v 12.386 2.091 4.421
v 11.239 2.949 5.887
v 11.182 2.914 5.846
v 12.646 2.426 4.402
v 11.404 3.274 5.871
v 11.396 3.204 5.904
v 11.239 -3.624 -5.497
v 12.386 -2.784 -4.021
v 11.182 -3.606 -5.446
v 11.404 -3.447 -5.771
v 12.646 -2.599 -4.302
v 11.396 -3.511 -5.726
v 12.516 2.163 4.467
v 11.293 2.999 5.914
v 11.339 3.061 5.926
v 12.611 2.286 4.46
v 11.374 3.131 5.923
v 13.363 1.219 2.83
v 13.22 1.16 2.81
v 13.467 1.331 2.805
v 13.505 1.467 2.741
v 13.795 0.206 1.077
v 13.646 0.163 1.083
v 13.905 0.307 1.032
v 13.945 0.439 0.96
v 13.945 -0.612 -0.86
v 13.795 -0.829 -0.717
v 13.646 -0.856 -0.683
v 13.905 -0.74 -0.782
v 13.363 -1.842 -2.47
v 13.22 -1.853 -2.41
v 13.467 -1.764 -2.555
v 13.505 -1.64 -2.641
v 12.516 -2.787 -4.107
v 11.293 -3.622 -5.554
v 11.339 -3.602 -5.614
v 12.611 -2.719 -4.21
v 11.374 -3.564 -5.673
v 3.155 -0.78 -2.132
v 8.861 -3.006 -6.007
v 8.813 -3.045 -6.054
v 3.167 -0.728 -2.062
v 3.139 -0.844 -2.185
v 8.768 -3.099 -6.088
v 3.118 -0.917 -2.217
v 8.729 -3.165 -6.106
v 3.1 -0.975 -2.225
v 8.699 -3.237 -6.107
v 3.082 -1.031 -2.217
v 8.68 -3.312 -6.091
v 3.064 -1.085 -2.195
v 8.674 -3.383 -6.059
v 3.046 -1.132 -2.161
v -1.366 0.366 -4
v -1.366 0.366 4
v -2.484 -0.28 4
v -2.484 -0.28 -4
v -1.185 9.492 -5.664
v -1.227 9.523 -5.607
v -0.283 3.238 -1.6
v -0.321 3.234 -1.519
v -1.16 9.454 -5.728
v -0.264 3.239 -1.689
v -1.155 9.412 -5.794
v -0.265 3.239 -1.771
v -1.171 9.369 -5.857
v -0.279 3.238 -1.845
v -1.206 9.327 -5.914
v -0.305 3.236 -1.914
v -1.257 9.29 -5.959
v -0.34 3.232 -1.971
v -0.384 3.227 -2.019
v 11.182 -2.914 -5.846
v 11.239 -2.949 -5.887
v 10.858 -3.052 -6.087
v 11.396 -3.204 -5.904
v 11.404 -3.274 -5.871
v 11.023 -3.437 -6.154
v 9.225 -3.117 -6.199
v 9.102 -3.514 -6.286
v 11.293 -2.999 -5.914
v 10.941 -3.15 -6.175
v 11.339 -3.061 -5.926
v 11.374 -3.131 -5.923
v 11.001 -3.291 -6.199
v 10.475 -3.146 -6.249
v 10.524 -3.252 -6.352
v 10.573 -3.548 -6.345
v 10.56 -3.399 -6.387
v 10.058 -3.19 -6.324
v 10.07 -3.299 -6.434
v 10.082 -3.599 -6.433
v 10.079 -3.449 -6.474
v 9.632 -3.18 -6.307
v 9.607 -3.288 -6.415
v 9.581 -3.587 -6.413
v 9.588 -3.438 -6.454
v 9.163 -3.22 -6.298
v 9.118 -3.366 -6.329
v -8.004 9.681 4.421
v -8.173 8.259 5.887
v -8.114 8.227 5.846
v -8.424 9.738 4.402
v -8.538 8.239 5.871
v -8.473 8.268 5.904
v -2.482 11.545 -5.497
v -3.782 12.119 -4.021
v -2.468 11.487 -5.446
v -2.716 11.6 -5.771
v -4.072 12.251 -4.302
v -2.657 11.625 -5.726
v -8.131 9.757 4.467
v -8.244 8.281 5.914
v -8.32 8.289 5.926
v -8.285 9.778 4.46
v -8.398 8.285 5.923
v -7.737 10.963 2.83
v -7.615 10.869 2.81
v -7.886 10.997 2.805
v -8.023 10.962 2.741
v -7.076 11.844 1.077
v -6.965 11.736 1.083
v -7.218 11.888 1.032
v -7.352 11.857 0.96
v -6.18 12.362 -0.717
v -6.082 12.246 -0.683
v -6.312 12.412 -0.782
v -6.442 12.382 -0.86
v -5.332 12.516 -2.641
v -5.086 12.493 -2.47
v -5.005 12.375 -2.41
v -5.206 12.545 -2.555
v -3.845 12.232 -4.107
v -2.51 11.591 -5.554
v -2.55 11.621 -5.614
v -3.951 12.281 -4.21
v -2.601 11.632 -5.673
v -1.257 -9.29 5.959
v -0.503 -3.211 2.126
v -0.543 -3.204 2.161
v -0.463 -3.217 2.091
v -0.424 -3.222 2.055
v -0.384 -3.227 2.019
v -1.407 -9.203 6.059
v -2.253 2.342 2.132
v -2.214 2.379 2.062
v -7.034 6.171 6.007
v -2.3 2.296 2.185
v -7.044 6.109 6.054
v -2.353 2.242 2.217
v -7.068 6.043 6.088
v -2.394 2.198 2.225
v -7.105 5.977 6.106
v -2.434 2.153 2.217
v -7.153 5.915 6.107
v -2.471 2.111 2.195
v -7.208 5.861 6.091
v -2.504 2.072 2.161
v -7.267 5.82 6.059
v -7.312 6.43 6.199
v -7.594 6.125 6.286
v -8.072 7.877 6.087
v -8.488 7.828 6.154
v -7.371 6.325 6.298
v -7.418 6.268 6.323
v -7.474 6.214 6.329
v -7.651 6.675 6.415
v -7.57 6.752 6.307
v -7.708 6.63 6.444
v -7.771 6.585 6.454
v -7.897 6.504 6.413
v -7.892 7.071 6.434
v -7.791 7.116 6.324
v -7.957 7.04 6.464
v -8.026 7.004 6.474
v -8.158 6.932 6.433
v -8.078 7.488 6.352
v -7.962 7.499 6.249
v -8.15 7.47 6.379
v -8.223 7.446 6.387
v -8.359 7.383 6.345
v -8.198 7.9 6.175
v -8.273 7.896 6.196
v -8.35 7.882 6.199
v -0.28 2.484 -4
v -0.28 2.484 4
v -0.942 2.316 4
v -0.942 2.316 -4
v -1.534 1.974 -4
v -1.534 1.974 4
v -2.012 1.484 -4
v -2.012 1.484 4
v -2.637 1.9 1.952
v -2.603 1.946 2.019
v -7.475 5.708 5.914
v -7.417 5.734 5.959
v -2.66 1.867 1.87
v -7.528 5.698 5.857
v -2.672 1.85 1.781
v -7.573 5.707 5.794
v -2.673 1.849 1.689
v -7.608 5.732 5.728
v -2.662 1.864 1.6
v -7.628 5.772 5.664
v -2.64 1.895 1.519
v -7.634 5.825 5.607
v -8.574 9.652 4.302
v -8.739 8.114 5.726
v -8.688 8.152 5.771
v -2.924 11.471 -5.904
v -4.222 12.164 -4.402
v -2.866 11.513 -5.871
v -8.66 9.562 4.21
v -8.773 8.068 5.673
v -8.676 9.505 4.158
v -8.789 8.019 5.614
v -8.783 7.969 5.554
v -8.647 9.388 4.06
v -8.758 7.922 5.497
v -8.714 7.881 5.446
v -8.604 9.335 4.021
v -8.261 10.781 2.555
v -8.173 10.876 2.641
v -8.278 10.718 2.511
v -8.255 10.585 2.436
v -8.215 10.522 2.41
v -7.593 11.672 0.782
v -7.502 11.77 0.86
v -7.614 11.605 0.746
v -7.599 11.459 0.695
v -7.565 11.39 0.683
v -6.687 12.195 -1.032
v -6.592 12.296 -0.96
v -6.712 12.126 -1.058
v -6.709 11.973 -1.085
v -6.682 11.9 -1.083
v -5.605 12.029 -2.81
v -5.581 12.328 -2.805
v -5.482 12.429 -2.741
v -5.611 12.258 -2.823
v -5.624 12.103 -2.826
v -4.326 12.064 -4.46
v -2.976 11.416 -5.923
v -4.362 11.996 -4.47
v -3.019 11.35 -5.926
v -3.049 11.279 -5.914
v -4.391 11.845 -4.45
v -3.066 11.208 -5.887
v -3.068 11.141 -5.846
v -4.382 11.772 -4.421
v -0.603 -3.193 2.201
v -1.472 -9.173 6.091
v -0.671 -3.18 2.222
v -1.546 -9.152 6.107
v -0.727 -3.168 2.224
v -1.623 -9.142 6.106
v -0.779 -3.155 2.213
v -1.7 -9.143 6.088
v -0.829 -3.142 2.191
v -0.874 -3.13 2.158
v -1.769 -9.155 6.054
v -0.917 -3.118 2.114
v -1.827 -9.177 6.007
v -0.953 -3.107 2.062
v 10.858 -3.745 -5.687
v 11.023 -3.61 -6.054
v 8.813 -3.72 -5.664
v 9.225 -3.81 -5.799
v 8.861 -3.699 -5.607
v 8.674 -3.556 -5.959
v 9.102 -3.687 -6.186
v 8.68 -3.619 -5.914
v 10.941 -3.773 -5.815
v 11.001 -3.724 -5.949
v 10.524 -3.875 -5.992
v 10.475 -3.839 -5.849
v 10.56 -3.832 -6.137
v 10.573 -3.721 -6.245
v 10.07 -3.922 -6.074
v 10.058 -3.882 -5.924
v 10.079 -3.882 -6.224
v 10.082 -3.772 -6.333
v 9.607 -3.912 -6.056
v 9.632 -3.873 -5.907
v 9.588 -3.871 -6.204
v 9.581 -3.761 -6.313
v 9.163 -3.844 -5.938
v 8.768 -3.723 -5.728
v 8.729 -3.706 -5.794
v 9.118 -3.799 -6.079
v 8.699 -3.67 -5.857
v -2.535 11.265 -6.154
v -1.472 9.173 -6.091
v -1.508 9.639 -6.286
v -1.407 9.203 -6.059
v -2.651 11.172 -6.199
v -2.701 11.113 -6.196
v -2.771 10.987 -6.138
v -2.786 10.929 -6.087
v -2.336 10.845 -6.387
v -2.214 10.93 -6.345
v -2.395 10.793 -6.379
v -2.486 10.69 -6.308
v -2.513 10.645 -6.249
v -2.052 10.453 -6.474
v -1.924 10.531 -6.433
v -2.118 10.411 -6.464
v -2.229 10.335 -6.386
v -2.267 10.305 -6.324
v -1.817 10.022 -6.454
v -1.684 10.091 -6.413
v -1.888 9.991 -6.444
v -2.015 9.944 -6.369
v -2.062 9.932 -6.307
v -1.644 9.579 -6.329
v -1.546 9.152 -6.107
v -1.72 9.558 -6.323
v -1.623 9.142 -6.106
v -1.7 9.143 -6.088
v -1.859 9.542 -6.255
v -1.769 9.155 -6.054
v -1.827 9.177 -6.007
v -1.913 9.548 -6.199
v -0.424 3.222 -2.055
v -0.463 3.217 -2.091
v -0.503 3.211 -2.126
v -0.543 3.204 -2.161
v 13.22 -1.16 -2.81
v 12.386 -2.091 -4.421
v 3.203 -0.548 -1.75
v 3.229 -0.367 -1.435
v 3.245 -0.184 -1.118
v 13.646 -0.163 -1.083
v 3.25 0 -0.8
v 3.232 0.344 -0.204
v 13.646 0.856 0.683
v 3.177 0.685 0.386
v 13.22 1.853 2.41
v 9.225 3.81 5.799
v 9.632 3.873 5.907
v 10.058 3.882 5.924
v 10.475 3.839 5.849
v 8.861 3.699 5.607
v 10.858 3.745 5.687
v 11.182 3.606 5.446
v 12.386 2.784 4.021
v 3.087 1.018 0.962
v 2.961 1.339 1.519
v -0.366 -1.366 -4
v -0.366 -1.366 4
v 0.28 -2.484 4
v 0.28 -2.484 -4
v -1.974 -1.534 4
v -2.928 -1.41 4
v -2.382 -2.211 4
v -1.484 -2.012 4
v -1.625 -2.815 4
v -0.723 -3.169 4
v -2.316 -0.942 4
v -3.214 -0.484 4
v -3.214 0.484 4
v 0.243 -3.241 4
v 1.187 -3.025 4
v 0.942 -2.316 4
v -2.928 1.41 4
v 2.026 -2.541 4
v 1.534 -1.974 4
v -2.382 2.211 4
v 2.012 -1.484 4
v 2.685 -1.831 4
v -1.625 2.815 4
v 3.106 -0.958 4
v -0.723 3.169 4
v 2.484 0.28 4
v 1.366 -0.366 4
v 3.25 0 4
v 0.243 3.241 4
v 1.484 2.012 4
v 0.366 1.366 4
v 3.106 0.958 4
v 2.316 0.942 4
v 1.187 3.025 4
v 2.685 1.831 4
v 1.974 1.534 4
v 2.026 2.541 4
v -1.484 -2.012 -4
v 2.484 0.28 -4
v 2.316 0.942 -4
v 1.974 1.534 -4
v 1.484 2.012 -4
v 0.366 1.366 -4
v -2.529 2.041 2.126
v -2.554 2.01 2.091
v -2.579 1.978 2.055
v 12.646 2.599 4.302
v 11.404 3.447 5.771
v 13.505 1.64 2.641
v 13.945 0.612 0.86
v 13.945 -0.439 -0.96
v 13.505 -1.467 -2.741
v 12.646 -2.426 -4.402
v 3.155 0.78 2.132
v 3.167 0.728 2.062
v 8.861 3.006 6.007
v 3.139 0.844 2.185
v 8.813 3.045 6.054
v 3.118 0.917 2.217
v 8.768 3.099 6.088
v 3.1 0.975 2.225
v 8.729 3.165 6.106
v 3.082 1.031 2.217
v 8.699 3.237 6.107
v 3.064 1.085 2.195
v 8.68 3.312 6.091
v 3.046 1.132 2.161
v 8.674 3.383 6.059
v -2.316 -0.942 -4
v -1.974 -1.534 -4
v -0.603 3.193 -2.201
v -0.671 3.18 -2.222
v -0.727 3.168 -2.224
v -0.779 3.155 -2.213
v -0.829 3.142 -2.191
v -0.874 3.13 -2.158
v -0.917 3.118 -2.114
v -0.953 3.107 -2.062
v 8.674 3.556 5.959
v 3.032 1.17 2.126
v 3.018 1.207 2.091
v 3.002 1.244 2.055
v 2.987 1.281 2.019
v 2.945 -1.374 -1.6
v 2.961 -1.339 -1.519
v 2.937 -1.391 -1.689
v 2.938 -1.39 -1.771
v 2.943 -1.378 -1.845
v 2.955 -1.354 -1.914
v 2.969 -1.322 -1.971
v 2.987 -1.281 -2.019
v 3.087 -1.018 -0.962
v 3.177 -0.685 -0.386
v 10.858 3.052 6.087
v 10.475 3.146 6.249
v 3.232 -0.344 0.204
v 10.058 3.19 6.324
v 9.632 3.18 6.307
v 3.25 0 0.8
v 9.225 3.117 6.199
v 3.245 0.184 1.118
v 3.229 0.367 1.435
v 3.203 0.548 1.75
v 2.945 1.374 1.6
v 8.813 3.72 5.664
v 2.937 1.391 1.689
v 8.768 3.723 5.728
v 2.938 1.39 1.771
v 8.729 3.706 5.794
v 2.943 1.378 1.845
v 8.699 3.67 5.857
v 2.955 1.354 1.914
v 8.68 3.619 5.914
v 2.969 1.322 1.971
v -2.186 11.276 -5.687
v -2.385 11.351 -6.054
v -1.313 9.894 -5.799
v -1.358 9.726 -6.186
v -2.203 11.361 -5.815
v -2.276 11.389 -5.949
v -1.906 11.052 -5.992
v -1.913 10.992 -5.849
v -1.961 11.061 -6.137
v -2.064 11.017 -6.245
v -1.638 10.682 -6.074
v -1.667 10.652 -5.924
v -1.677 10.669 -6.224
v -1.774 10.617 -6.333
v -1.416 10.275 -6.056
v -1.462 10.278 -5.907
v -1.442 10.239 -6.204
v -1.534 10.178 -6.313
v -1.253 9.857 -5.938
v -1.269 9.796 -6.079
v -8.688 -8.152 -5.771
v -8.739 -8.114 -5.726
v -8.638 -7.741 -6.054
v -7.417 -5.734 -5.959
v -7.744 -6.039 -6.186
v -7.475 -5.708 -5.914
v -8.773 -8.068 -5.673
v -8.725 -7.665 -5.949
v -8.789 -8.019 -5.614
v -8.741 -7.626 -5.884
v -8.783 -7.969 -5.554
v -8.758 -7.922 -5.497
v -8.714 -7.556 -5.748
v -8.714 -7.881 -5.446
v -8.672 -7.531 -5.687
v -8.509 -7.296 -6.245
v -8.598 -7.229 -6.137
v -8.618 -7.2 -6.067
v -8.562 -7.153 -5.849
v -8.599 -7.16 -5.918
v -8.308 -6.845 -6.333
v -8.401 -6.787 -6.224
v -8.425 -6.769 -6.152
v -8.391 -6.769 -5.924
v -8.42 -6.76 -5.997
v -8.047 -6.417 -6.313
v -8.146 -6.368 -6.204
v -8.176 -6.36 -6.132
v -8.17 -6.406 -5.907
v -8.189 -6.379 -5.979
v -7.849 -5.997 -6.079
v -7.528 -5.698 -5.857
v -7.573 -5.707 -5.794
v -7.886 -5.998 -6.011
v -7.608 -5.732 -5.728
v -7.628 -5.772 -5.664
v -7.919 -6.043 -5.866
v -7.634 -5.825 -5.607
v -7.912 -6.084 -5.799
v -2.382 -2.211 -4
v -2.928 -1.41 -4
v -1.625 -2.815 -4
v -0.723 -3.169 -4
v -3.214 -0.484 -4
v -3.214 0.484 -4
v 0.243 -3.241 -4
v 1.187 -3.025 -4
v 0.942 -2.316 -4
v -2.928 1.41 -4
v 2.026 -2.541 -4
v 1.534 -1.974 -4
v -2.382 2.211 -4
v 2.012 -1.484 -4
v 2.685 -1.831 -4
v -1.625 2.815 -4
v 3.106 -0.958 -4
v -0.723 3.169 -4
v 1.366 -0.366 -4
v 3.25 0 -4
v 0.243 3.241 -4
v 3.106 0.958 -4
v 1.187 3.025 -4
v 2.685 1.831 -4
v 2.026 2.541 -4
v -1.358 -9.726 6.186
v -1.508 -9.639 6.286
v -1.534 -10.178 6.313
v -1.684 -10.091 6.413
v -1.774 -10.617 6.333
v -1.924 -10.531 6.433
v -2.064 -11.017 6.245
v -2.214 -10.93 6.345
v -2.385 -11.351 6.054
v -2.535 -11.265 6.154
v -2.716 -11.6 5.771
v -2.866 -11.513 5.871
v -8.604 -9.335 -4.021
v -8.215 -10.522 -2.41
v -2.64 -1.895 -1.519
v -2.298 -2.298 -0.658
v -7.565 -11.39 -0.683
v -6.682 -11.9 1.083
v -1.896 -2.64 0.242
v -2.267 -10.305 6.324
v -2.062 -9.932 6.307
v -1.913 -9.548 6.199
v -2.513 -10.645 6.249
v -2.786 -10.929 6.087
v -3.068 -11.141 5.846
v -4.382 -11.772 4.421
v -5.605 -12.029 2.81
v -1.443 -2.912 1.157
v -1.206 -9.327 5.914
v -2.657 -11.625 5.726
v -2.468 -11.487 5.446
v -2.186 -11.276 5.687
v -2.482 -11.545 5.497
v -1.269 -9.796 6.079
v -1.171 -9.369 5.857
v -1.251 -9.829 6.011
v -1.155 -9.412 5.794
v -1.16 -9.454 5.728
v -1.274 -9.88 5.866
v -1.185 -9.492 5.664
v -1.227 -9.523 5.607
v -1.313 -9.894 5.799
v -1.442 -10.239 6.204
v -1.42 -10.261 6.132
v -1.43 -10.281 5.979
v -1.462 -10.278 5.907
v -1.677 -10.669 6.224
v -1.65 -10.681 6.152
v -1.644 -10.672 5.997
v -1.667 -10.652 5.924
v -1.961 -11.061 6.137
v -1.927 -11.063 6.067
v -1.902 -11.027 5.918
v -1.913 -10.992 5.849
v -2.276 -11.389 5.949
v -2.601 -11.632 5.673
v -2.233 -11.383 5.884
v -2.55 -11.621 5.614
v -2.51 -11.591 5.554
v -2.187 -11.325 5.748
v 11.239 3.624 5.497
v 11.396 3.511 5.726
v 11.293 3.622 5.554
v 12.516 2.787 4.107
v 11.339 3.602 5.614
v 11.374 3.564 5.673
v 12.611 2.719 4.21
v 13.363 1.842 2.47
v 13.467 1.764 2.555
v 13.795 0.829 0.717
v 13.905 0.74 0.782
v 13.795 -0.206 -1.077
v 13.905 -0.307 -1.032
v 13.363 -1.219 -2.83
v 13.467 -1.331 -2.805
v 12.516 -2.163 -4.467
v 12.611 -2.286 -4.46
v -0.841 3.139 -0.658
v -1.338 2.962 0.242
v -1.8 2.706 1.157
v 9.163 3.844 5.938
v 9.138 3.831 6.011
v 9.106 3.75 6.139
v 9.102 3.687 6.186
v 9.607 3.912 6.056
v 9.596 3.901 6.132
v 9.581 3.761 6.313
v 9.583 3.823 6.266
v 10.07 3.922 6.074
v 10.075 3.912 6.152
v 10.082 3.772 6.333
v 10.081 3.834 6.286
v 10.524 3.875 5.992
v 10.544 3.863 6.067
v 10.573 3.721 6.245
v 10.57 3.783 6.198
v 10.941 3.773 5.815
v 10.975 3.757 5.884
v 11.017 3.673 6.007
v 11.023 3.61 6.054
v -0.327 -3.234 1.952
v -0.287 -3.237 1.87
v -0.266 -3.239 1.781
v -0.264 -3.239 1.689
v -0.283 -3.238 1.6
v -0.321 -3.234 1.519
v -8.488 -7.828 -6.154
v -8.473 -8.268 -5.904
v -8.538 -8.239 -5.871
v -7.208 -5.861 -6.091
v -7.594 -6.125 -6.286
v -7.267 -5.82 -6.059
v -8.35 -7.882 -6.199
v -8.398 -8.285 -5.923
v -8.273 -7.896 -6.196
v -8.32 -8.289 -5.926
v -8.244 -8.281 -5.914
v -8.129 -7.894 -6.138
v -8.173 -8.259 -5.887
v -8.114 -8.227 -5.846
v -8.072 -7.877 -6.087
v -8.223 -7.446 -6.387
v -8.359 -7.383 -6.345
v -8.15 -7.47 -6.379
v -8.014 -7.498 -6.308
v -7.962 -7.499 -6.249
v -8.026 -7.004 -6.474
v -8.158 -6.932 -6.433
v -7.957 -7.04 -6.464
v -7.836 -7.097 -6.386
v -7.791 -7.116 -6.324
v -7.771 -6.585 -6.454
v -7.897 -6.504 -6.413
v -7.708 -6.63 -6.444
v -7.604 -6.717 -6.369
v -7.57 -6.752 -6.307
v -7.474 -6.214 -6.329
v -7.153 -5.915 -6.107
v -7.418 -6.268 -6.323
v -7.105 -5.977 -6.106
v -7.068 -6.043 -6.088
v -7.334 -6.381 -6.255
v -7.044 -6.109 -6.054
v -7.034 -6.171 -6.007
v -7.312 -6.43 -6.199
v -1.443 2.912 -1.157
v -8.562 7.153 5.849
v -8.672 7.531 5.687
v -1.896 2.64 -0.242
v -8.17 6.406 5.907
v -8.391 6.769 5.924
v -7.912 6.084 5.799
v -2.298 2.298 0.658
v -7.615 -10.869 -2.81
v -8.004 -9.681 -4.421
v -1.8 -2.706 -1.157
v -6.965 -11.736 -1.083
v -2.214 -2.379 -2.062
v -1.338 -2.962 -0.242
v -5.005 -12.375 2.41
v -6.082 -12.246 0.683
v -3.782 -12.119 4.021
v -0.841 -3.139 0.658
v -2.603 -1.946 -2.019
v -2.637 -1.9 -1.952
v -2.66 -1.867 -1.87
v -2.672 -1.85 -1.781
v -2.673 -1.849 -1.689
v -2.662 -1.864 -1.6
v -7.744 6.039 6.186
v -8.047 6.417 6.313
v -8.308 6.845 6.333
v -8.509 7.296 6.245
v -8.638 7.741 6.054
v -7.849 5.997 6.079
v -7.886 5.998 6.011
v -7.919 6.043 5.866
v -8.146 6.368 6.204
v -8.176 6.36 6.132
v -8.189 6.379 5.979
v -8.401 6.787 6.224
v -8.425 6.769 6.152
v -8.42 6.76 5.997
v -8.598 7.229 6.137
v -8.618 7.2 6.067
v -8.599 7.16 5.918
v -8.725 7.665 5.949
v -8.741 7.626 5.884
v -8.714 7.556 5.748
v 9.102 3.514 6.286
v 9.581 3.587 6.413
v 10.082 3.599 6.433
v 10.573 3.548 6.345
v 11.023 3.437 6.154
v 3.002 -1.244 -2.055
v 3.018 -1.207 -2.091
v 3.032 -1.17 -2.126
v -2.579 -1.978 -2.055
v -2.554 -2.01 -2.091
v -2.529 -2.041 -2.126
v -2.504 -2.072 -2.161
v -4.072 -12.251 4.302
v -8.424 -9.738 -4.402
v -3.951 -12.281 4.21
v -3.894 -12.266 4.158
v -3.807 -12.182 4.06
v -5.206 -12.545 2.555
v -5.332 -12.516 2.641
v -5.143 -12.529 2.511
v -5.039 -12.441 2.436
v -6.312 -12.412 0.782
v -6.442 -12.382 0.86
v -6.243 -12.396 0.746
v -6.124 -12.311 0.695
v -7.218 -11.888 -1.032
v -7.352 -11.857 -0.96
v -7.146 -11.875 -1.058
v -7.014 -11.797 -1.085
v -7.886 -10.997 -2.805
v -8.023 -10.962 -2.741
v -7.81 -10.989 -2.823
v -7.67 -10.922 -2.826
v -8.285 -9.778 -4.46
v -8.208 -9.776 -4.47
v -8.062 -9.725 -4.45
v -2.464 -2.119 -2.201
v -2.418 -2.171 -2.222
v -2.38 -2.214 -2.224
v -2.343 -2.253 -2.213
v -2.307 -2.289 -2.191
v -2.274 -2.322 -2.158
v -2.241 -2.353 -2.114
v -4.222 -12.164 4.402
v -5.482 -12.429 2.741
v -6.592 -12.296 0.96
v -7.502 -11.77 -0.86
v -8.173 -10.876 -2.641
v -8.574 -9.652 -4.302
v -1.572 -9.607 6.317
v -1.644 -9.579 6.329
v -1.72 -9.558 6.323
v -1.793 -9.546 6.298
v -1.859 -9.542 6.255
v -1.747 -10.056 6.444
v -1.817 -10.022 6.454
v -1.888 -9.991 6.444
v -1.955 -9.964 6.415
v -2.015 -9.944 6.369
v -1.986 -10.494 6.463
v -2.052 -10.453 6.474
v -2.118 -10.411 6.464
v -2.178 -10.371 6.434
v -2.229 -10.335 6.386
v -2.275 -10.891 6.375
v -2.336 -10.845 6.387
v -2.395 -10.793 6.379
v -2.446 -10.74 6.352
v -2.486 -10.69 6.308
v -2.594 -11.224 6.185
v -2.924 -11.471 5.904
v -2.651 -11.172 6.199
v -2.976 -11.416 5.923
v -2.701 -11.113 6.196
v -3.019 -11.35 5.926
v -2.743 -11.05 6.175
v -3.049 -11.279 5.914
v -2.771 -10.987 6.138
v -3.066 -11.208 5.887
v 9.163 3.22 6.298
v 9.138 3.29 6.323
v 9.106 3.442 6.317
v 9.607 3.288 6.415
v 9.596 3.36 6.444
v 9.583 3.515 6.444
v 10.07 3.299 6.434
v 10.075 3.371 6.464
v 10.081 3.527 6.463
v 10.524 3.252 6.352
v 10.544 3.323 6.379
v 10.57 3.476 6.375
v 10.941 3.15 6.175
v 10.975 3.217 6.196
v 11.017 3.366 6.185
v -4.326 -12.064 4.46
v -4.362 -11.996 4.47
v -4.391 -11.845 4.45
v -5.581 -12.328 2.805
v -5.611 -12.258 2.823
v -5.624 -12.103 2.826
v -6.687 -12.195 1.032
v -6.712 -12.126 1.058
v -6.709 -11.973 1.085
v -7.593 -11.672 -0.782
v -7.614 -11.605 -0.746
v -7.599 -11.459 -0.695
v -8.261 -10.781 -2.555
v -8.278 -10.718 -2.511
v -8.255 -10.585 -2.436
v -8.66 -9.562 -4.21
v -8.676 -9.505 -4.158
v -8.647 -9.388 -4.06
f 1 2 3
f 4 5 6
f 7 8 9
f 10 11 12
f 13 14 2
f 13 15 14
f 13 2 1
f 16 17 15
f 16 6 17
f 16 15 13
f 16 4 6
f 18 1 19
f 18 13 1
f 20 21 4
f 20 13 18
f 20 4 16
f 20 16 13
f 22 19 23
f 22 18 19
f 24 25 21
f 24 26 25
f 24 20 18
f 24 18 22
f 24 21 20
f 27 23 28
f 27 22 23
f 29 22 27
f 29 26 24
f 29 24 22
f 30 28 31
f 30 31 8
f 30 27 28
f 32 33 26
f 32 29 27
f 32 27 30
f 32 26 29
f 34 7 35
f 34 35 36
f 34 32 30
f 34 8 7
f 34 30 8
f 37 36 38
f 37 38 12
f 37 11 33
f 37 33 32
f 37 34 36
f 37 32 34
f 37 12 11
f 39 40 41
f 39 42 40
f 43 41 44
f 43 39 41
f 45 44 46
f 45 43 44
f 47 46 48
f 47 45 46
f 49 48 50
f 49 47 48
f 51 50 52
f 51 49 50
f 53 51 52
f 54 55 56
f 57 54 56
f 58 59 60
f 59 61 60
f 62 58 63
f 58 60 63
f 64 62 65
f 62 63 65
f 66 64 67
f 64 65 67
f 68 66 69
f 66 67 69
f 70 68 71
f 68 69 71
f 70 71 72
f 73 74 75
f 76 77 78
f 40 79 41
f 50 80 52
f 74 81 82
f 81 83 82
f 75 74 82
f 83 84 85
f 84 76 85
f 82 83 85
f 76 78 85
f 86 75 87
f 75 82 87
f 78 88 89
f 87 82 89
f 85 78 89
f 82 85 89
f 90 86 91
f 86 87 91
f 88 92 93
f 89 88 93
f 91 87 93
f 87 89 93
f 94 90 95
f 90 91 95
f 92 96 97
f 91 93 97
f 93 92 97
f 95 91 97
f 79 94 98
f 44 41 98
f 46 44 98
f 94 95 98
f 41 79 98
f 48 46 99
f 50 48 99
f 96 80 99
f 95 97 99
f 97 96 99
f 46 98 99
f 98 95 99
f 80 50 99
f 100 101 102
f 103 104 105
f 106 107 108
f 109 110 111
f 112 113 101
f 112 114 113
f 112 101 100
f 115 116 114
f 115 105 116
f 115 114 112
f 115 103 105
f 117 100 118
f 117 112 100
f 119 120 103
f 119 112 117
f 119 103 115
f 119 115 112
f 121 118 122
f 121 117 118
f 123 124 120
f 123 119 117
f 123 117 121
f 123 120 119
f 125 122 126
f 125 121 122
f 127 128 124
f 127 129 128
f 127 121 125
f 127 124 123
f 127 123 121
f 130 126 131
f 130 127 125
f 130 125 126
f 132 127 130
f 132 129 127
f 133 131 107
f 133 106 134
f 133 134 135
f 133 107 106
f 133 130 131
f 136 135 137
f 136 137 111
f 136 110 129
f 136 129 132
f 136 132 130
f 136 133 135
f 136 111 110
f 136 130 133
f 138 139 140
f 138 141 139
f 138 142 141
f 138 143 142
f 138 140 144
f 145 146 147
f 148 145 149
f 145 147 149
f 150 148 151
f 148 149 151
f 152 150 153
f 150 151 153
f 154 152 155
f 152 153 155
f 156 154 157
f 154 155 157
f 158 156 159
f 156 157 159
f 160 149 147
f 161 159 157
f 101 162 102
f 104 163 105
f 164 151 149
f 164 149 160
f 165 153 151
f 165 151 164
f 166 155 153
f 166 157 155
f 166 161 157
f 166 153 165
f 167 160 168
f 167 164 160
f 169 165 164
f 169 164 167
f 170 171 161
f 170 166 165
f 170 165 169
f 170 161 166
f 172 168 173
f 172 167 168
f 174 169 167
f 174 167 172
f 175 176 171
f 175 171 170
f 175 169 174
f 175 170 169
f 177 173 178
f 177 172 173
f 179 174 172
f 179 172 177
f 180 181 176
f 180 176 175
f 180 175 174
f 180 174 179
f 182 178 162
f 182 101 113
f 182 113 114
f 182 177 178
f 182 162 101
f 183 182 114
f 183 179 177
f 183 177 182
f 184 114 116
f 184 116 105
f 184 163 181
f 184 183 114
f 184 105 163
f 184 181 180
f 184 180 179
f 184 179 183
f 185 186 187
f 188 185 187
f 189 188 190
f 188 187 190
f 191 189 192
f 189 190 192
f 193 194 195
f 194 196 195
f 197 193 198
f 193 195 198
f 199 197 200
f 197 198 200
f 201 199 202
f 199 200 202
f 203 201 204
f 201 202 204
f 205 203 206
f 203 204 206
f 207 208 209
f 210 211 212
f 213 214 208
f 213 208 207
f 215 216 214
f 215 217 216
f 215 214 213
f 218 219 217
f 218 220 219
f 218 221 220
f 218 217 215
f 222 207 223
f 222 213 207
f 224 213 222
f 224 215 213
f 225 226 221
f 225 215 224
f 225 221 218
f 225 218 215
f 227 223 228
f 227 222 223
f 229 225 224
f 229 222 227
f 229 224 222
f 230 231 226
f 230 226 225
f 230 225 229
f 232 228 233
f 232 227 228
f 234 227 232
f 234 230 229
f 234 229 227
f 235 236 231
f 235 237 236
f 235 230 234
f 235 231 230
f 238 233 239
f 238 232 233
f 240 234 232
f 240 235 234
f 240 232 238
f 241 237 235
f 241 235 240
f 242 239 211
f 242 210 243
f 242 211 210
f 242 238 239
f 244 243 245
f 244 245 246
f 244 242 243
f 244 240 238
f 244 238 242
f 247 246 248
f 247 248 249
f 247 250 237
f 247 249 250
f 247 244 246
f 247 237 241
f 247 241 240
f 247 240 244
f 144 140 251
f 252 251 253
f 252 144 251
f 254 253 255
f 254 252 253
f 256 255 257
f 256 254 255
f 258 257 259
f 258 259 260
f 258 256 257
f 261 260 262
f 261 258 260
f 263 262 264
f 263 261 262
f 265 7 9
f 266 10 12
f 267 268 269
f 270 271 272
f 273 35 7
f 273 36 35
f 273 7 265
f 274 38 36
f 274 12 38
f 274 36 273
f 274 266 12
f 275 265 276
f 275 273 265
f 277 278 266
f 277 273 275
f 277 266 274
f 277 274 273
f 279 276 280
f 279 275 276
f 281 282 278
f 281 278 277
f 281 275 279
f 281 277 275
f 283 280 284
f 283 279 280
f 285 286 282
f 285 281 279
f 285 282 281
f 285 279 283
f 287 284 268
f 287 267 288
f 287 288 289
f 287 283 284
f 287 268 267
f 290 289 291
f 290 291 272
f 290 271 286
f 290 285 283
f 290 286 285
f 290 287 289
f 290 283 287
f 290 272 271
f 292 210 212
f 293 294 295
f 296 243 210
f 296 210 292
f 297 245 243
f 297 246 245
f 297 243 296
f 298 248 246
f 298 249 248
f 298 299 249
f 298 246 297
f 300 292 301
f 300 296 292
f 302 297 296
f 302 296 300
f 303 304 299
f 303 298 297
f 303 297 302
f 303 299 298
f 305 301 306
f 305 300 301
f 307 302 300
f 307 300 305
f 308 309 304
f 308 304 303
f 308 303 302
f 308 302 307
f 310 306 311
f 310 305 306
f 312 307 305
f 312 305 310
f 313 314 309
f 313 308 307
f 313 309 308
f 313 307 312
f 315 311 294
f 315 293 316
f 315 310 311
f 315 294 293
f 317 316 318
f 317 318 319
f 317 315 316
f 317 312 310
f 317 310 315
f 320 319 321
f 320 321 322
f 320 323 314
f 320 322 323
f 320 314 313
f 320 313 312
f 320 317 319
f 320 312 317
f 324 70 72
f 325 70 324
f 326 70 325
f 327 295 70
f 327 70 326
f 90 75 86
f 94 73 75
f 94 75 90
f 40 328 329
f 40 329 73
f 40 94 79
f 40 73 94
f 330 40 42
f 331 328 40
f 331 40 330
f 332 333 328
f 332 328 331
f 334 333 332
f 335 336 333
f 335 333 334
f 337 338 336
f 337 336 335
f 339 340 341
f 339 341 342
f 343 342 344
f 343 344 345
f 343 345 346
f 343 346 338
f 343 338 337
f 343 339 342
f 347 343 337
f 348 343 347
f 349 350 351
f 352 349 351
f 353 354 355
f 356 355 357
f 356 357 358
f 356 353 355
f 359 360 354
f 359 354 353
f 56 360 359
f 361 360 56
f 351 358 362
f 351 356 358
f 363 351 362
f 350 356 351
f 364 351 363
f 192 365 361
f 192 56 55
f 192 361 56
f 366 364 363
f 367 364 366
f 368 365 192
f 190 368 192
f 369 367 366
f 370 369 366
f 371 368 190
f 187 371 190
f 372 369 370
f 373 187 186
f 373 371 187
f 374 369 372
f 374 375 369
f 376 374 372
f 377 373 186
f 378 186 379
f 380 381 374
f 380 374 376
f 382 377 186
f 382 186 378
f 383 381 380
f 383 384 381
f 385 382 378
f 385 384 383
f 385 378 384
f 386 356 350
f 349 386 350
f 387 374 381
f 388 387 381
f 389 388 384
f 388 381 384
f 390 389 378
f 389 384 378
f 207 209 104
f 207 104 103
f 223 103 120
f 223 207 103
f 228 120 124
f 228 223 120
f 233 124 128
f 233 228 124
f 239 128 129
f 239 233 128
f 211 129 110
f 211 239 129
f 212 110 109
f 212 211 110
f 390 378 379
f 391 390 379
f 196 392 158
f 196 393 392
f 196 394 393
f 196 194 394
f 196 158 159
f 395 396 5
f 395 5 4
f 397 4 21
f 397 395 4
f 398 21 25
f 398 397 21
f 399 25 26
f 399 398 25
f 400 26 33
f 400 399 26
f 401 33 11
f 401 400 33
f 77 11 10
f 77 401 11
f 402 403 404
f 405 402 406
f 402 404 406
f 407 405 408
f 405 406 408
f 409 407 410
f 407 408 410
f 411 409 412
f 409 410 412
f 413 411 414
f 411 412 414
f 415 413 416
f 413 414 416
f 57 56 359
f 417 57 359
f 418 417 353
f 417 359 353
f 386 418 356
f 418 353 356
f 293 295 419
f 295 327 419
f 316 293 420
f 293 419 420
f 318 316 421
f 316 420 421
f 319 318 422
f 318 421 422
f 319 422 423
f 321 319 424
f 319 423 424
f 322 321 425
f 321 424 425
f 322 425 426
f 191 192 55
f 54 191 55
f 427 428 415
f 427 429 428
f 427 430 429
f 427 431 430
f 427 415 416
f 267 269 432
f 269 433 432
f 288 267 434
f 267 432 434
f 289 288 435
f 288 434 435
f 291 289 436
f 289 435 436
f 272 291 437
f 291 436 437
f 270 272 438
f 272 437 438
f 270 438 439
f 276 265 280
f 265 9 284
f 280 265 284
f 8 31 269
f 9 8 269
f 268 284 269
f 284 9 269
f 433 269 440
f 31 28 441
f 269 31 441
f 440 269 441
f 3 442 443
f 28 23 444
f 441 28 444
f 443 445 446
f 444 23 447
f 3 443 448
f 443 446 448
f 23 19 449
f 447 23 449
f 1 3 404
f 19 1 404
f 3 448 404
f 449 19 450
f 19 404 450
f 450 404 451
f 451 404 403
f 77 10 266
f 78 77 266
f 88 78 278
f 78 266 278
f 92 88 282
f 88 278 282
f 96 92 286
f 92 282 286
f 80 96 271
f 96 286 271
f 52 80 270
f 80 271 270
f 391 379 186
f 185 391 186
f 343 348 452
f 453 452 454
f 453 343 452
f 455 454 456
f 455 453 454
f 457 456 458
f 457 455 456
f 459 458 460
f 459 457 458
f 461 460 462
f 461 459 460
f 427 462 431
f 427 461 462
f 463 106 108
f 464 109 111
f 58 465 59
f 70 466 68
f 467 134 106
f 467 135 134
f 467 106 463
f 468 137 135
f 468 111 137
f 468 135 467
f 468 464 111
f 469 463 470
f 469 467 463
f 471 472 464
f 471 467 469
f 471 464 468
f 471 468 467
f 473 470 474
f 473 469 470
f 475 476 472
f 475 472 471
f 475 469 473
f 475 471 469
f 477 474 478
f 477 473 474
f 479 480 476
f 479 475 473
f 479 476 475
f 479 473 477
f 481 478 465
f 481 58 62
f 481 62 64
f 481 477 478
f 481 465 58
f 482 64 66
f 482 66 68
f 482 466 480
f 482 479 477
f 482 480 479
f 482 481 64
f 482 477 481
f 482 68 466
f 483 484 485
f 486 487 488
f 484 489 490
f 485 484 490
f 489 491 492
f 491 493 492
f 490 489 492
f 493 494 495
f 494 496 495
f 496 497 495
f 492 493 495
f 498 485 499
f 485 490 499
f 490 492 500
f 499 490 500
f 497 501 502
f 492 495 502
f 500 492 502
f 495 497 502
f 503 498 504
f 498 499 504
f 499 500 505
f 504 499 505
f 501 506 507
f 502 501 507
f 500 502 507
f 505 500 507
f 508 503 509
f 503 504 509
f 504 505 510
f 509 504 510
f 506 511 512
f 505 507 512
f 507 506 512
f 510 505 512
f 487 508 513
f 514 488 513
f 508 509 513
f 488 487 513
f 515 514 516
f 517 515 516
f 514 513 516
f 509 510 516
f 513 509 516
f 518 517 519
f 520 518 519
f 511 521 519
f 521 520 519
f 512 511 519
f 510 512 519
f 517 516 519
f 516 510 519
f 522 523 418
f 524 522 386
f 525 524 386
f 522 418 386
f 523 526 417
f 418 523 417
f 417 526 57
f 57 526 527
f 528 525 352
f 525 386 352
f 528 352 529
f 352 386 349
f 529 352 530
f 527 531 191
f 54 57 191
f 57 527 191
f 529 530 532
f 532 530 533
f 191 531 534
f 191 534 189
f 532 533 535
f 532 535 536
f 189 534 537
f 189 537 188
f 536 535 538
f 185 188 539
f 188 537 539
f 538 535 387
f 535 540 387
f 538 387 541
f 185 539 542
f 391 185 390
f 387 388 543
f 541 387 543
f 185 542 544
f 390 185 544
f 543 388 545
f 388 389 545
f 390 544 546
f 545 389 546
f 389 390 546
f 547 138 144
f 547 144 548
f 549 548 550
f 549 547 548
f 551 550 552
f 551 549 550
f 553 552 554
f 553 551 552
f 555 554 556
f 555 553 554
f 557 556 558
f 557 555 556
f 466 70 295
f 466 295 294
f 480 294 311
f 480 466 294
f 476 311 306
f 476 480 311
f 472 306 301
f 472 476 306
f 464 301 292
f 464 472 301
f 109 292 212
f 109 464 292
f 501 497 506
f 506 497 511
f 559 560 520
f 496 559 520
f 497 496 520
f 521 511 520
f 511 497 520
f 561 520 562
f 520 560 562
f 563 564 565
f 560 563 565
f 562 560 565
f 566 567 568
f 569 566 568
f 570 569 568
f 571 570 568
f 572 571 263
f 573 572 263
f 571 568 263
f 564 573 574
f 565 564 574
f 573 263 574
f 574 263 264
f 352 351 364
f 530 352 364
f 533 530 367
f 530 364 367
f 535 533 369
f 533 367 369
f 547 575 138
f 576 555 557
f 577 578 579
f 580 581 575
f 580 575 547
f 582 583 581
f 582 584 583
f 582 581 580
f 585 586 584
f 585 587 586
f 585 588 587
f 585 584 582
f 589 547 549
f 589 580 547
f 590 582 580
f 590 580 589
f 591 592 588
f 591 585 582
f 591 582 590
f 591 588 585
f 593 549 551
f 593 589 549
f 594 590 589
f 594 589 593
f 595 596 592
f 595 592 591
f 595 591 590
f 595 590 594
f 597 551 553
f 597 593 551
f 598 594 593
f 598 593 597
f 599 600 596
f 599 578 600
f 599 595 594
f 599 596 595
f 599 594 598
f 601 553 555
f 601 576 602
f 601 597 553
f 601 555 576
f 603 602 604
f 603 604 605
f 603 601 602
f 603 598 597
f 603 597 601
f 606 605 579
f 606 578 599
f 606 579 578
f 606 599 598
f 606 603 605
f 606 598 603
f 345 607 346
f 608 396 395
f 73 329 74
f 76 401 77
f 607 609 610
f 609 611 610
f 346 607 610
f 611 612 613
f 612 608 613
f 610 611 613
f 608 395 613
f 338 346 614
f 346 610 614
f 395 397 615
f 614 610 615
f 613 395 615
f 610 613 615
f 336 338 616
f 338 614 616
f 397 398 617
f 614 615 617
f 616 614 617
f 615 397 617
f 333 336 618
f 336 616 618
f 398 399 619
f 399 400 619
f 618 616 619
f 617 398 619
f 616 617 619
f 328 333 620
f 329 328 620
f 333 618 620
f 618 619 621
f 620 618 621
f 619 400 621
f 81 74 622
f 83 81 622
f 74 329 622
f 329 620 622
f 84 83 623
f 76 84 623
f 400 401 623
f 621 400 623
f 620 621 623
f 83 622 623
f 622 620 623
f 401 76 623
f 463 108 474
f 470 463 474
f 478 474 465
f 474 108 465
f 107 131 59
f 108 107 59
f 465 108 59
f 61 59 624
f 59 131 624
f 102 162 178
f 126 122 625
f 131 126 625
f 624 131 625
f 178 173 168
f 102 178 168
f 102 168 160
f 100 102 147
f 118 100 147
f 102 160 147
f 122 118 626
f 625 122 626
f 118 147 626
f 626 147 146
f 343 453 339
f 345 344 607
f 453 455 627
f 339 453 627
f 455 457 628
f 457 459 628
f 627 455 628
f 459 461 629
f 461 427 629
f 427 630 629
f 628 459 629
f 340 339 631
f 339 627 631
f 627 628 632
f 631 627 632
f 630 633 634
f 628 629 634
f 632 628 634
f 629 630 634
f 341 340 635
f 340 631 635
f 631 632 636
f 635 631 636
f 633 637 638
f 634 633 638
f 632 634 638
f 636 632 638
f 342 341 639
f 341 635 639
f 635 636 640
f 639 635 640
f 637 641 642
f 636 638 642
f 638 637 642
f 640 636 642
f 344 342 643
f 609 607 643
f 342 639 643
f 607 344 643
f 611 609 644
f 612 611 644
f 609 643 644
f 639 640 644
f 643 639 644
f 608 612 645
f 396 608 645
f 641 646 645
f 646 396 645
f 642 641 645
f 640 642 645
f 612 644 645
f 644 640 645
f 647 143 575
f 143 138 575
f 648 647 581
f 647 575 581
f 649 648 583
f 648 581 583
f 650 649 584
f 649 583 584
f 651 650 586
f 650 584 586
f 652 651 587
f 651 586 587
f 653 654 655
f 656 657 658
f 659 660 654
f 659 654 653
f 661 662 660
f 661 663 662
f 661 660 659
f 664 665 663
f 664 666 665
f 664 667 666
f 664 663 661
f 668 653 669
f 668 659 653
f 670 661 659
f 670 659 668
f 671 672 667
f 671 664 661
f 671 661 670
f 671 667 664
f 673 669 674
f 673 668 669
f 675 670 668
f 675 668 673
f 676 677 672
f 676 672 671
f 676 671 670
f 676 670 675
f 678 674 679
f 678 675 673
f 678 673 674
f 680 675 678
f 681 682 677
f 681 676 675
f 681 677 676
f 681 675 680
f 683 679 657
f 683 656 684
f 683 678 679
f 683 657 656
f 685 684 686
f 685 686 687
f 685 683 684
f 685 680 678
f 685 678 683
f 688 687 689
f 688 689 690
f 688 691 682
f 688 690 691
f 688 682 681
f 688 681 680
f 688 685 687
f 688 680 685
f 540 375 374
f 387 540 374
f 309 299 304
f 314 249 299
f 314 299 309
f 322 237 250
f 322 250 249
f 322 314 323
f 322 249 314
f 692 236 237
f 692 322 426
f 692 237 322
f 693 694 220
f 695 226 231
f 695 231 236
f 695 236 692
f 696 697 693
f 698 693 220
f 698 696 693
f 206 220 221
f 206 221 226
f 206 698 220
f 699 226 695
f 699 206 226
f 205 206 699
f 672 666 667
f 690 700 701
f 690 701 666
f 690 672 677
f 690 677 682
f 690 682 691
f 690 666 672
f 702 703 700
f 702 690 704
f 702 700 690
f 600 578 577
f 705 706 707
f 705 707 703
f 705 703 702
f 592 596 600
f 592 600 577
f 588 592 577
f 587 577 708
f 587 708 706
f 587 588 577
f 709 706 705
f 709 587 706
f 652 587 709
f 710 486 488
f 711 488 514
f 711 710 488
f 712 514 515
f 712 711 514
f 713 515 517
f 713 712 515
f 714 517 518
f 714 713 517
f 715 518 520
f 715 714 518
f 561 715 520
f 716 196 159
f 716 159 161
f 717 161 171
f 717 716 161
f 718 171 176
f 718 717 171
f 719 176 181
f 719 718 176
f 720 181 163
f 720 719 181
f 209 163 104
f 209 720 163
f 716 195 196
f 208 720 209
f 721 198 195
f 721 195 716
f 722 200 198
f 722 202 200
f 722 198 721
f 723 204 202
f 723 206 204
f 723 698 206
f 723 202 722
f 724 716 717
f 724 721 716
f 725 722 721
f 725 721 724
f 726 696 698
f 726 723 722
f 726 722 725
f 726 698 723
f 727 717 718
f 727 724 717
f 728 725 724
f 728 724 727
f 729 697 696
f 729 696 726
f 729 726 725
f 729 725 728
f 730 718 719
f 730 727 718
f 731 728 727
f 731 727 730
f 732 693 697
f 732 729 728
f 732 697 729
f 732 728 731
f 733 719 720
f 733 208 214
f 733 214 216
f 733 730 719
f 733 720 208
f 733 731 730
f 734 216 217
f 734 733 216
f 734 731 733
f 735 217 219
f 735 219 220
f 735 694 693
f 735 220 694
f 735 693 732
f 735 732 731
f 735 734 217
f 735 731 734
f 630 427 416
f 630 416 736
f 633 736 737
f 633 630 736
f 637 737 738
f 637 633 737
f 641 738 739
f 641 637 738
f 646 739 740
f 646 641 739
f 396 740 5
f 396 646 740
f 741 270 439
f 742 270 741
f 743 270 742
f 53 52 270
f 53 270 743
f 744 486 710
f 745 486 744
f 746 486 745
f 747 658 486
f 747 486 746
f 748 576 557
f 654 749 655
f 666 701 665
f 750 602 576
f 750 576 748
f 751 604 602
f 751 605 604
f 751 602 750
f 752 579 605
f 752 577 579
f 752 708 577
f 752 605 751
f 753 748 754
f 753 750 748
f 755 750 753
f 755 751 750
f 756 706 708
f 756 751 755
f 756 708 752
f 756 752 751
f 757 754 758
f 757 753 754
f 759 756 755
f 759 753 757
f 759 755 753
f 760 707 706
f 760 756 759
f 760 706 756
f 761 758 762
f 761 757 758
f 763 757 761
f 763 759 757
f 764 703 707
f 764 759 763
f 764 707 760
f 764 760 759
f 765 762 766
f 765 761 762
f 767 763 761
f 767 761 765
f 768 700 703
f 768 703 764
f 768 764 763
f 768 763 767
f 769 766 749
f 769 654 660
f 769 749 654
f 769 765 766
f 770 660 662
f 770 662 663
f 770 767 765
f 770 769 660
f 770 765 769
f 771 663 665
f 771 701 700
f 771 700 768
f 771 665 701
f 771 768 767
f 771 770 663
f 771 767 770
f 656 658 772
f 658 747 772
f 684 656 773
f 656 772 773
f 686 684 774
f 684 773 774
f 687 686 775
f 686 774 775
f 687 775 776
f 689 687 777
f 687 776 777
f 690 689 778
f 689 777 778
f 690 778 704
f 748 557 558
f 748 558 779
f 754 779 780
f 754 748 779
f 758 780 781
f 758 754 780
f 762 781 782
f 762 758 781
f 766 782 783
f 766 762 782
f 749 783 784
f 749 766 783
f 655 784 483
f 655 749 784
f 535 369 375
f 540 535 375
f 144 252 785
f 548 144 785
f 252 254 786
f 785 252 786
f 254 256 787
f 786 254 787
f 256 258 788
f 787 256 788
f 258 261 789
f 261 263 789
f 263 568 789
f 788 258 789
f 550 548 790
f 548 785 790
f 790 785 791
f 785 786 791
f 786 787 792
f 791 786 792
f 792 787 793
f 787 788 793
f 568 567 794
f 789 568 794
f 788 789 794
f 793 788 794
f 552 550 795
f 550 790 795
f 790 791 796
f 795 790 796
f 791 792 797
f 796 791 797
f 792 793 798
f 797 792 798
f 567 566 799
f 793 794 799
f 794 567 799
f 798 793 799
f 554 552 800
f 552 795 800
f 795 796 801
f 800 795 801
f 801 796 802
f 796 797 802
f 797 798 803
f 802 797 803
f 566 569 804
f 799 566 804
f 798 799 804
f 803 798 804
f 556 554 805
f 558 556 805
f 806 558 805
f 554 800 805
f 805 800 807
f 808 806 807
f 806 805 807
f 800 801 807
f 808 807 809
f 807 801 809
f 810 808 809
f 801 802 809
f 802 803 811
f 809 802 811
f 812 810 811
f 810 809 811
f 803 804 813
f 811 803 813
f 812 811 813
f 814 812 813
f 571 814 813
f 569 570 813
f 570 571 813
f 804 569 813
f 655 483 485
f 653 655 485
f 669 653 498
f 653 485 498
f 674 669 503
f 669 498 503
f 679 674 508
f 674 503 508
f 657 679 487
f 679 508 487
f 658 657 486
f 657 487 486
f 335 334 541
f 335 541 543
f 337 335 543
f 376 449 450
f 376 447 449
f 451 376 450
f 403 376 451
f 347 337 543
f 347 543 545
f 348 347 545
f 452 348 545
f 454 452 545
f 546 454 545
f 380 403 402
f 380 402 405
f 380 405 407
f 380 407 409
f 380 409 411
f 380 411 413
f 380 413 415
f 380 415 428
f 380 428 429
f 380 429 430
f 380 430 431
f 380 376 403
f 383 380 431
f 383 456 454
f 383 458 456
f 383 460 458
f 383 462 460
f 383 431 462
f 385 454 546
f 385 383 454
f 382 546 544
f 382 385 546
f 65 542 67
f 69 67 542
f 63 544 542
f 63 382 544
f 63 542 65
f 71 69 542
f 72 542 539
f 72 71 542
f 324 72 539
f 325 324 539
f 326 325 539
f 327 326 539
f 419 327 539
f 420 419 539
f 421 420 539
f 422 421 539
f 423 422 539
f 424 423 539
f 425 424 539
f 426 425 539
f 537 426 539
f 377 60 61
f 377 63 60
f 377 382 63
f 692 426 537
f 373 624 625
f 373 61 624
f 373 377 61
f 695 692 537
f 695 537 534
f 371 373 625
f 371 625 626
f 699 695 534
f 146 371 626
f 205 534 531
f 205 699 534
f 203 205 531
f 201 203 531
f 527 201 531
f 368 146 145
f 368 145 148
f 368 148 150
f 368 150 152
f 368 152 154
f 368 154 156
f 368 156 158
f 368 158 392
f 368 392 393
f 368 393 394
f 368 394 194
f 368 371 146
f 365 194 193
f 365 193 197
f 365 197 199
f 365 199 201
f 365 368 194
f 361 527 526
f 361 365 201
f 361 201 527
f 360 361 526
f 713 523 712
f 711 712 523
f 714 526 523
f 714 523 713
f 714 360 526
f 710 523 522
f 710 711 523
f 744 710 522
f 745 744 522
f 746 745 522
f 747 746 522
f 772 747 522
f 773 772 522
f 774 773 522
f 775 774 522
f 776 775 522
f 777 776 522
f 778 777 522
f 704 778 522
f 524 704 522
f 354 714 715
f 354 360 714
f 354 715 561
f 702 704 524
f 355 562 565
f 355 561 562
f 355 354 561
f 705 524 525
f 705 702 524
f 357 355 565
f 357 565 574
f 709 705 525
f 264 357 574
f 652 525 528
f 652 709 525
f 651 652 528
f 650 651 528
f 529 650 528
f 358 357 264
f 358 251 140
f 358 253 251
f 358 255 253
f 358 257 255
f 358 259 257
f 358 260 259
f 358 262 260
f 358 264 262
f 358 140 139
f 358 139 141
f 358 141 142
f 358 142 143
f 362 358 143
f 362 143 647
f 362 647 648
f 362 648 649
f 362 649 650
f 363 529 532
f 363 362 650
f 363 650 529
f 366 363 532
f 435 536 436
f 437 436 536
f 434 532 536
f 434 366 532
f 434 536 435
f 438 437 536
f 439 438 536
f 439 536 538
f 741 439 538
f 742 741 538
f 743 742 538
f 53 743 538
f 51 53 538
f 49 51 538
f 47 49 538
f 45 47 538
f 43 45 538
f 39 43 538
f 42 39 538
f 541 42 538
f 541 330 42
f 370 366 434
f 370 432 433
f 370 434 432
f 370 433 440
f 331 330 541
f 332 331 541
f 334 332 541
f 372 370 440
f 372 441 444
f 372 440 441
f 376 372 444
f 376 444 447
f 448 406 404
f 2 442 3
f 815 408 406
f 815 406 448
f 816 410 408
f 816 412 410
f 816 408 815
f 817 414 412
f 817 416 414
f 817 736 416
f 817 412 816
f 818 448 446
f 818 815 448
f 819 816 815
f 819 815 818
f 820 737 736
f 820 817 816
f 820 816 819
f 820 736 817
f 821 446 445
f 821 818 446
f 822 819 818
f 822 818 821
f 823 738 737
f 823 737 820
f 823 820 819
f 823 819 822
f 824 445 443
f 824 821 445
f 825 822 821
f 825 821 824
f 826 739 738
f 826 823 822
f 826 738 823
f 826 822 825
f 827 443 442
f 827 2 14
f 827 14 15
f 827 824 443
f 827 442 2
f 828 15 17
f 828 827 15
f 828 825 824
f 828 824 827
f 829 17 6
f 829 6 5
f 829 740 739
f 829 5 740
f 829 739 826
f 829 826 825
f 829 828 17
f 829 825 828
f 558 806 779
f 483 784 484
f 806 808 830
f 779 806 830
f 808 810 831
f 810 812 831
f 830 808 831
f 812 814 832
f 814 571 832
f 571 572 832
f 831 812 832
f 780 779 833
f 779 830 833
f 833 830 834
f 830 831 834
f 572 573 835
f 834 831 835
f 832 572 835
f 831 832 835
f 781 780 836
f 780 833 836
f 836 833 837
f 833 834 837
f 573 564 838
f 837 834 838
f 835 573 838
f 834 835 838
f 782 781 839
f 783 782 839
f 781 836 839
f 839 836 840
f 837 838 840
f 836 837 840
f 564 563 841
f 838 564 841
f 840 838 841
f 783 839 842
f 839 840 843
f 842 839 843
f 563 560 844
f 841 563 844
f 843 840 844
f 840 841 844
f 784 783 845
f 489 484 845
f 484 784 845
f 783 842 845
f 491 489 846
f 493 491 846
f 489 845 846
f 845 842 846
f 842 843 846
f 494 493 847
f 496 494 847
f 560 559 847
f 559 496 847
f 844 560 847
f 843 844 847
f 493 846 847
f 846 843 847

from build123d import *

# Parameters (mm, degrees)
SKETCH1_R                = 3.25
BOSS_EXTRUDE1_DEPTH      = 4
BOSS_EXTRUDE4_DEPTH      = 0.4
FILLET1_R                = 2
CIRPATTERN2_COUNT        = 3
FILLET1_OF_CIRPATTERN2_R = 2
CUT_EXTRUDE1_REACH       = 23.637
FILLET2_R                = 0.3


with BuildPart() as part:
    # Sketch1 → Boss-Extrude1 (new, symmetric)
    with BuildSketch(Plane.XY):
        Circle(SKETCH1_R)
    extrude(amount=BOSS_EXTRUDE1_DEPTH, both=True)

    # Sketch6 → Boss-Extrude4 (add, symmetric)
    with BuildSketch(Plane(origin=(0, 0, 0), x_dir=(-1, 0, 0), z_dir=(0, 0.866025403784438, -0.500000000000001))):
        with BuildLine():
            Line((0, 0), (-10, 8))
            ThreePointArc((-10, 8), (-14, 0), (-10, -8))
            Line((-10, -8), (0, 0))
        make_face()
    boss_extrude4 = extrude(amount=BOSS_EXTRUDE4_DEPTH, both=True)

    # Fillet1
    fillet1_edges = [part.edges().sort_by_distance(p)[0] for p in [
        (10, -4, -6.92820323),
        (10, 4, 6.92820323),
    ]]
    fillet(fillet1_edges, radius=FILLET1_R)

    # CirPattern2: Boss-Extrude4 ×3 about axis
    cirpattern2_axis = Axis((0, 0, 4), (0, 0, -1))
    for i in range(1, CIRPATTERN2_COUNT):
        add(boss_extrude4.rotate(cirpattern2_axis, i * 360 / CIRPATTERN2_COUNT))

    # Fillet1 of CirPattern2
    fillet1_of_cirpattern2_edges = [part.edges().sort_by_distance(p)[0] for p in [
        (-8.464101615, -6.660254038, -6.92820323),
        (-1.535898385, -10.660254038, 6.92820323),
        (-1.535898385, 10.660254038, -6.92820323),
        (-8.464101615, 6.660254038, 6.92820323),
    ]]
    fillet(fillet1_of_cirpattern2_edges, radius=FILLET1_OF_CIRPATTERN2_R)

    # Sketch7 → Cut-Extrude1 (cut, up to next)
    with BuildSketch(Plane.XY.offset(4), mode=Mode.PRIVATE) as cut_extrude1_sk1:
        with BuildLine():
            Line((1.484313483, 2.011669328), (0.366025404, 1.366025404))
            Line((0.366025404, 1.366025404), (-0.27961852, 2.484313483))
            ThreePointArc((-0.27961852, 2.484313483), (-1.25, 2.165063509), (-2.011669328, 1.484313483))
            Line((-2.011669328, 1.484313483), (-1.366025404, 0.366025404))
            Line((-1.366025404, 0.366025404), (-2.484313483, -0.27961852))
            ThreePointArc((-2.484313483, -0.27961852), (-2.165063509, -1.25), (-1.484313483, -2.011669328))
            Line((-1.484313483, -2.011669328), (-0.366025404, -1.366025404))
            Line((-0.366025404, -1.366025404), (0.27961852, -2.484313483))
            ThreePointArc((0.27961852, -2.484313483), (1.25, -2.165063509), (2.011669328, -1.484313483))
            Line((2.011669328, -1.484313483), (1.366025404, -0.366025404))
            Line((1.366025404, -0.366025404), (2.484313483, 0.27961852))
            ThreePointArc((2.484313483, 0.27961852), (2.165063509, 1.25), (1.484313483, 2.011669328))
        make_face()
    cut_extrude1_tool1 = extrude(cut_extrude1_sk1.sketch, amount=-CUT_EXTRUDE1_REACH, mode=Mode.PRIVATE) & part.part
    add(cut_extrude1_tool1.solids().sort_by_distance((0, 0, 4))[0], mode=Mode.SUBTRACT)

    # Fillet2
    fillet2_edges = [part.edges().sort_by_distance(p)[0] for p in [
        (-1.20587358, -6.114217695, 4.286257479),
        (-2.149245107, -10.400789842, 6.583480561),
        (-7.3, -11.951150572, 0.2),
        (-8.532725669, -6.715285621, -6.183480561),
        (-0.587527, -6.333289225, 3.803498858),
        (-1.549245107, -10.747200003, 6.183480561),
        (-6.7, -12.297560734, -0.2),
        (-7.932725669, -7.061695783, -6.583480561),
        (-5.191025858, 3.67545792, 3.803498858),
        (-8.532725669, 6.715285621, 6.183480561),
        (-7.3, 11.951150572, -0.2),
        (-1.20587358, 6.114217695, -4.286257479),
        (-0.587527, 6.333289225, -3.803498858),
        (-4.692131059, 4.101426001, 4.286257479),
        (-7.932725669, 7.061695783, 6.583480561),
        (-6.7, 12.297560734, 0.2),
        (5.778552858, -2.657831305, -3.803498858),
        (10.081970776, -4.031914382, -6.183480561),
        (14, -0.346410162, 0.2),
        (10.081970776, 3.339094059, 6.583480561),
        (5.898004638, -2.012791694, -4.286257479),
        (10.081970776, -3.339094059, -6.583480561),
        (14, 0.346410162, -0.2),
        (10.081970776, 4.031914382, 6.183480561),
        (-5.191025858, -3.67545792, -3.803498858),
        (-4.692131059, -4.101426001, -4.286257479),
        (-2.149245107, 10.400789842, -6.583480561),
        (-1.549245107, 10.747200003, -6.183480561),
        (5.898004638, 2.012791694, 4.286257479),
        (5.778552858, 2.657831305, 3.803498858),
    ]]
    fillet(fillet2_edges, radius=FILLET2_R)


solid = part.part
